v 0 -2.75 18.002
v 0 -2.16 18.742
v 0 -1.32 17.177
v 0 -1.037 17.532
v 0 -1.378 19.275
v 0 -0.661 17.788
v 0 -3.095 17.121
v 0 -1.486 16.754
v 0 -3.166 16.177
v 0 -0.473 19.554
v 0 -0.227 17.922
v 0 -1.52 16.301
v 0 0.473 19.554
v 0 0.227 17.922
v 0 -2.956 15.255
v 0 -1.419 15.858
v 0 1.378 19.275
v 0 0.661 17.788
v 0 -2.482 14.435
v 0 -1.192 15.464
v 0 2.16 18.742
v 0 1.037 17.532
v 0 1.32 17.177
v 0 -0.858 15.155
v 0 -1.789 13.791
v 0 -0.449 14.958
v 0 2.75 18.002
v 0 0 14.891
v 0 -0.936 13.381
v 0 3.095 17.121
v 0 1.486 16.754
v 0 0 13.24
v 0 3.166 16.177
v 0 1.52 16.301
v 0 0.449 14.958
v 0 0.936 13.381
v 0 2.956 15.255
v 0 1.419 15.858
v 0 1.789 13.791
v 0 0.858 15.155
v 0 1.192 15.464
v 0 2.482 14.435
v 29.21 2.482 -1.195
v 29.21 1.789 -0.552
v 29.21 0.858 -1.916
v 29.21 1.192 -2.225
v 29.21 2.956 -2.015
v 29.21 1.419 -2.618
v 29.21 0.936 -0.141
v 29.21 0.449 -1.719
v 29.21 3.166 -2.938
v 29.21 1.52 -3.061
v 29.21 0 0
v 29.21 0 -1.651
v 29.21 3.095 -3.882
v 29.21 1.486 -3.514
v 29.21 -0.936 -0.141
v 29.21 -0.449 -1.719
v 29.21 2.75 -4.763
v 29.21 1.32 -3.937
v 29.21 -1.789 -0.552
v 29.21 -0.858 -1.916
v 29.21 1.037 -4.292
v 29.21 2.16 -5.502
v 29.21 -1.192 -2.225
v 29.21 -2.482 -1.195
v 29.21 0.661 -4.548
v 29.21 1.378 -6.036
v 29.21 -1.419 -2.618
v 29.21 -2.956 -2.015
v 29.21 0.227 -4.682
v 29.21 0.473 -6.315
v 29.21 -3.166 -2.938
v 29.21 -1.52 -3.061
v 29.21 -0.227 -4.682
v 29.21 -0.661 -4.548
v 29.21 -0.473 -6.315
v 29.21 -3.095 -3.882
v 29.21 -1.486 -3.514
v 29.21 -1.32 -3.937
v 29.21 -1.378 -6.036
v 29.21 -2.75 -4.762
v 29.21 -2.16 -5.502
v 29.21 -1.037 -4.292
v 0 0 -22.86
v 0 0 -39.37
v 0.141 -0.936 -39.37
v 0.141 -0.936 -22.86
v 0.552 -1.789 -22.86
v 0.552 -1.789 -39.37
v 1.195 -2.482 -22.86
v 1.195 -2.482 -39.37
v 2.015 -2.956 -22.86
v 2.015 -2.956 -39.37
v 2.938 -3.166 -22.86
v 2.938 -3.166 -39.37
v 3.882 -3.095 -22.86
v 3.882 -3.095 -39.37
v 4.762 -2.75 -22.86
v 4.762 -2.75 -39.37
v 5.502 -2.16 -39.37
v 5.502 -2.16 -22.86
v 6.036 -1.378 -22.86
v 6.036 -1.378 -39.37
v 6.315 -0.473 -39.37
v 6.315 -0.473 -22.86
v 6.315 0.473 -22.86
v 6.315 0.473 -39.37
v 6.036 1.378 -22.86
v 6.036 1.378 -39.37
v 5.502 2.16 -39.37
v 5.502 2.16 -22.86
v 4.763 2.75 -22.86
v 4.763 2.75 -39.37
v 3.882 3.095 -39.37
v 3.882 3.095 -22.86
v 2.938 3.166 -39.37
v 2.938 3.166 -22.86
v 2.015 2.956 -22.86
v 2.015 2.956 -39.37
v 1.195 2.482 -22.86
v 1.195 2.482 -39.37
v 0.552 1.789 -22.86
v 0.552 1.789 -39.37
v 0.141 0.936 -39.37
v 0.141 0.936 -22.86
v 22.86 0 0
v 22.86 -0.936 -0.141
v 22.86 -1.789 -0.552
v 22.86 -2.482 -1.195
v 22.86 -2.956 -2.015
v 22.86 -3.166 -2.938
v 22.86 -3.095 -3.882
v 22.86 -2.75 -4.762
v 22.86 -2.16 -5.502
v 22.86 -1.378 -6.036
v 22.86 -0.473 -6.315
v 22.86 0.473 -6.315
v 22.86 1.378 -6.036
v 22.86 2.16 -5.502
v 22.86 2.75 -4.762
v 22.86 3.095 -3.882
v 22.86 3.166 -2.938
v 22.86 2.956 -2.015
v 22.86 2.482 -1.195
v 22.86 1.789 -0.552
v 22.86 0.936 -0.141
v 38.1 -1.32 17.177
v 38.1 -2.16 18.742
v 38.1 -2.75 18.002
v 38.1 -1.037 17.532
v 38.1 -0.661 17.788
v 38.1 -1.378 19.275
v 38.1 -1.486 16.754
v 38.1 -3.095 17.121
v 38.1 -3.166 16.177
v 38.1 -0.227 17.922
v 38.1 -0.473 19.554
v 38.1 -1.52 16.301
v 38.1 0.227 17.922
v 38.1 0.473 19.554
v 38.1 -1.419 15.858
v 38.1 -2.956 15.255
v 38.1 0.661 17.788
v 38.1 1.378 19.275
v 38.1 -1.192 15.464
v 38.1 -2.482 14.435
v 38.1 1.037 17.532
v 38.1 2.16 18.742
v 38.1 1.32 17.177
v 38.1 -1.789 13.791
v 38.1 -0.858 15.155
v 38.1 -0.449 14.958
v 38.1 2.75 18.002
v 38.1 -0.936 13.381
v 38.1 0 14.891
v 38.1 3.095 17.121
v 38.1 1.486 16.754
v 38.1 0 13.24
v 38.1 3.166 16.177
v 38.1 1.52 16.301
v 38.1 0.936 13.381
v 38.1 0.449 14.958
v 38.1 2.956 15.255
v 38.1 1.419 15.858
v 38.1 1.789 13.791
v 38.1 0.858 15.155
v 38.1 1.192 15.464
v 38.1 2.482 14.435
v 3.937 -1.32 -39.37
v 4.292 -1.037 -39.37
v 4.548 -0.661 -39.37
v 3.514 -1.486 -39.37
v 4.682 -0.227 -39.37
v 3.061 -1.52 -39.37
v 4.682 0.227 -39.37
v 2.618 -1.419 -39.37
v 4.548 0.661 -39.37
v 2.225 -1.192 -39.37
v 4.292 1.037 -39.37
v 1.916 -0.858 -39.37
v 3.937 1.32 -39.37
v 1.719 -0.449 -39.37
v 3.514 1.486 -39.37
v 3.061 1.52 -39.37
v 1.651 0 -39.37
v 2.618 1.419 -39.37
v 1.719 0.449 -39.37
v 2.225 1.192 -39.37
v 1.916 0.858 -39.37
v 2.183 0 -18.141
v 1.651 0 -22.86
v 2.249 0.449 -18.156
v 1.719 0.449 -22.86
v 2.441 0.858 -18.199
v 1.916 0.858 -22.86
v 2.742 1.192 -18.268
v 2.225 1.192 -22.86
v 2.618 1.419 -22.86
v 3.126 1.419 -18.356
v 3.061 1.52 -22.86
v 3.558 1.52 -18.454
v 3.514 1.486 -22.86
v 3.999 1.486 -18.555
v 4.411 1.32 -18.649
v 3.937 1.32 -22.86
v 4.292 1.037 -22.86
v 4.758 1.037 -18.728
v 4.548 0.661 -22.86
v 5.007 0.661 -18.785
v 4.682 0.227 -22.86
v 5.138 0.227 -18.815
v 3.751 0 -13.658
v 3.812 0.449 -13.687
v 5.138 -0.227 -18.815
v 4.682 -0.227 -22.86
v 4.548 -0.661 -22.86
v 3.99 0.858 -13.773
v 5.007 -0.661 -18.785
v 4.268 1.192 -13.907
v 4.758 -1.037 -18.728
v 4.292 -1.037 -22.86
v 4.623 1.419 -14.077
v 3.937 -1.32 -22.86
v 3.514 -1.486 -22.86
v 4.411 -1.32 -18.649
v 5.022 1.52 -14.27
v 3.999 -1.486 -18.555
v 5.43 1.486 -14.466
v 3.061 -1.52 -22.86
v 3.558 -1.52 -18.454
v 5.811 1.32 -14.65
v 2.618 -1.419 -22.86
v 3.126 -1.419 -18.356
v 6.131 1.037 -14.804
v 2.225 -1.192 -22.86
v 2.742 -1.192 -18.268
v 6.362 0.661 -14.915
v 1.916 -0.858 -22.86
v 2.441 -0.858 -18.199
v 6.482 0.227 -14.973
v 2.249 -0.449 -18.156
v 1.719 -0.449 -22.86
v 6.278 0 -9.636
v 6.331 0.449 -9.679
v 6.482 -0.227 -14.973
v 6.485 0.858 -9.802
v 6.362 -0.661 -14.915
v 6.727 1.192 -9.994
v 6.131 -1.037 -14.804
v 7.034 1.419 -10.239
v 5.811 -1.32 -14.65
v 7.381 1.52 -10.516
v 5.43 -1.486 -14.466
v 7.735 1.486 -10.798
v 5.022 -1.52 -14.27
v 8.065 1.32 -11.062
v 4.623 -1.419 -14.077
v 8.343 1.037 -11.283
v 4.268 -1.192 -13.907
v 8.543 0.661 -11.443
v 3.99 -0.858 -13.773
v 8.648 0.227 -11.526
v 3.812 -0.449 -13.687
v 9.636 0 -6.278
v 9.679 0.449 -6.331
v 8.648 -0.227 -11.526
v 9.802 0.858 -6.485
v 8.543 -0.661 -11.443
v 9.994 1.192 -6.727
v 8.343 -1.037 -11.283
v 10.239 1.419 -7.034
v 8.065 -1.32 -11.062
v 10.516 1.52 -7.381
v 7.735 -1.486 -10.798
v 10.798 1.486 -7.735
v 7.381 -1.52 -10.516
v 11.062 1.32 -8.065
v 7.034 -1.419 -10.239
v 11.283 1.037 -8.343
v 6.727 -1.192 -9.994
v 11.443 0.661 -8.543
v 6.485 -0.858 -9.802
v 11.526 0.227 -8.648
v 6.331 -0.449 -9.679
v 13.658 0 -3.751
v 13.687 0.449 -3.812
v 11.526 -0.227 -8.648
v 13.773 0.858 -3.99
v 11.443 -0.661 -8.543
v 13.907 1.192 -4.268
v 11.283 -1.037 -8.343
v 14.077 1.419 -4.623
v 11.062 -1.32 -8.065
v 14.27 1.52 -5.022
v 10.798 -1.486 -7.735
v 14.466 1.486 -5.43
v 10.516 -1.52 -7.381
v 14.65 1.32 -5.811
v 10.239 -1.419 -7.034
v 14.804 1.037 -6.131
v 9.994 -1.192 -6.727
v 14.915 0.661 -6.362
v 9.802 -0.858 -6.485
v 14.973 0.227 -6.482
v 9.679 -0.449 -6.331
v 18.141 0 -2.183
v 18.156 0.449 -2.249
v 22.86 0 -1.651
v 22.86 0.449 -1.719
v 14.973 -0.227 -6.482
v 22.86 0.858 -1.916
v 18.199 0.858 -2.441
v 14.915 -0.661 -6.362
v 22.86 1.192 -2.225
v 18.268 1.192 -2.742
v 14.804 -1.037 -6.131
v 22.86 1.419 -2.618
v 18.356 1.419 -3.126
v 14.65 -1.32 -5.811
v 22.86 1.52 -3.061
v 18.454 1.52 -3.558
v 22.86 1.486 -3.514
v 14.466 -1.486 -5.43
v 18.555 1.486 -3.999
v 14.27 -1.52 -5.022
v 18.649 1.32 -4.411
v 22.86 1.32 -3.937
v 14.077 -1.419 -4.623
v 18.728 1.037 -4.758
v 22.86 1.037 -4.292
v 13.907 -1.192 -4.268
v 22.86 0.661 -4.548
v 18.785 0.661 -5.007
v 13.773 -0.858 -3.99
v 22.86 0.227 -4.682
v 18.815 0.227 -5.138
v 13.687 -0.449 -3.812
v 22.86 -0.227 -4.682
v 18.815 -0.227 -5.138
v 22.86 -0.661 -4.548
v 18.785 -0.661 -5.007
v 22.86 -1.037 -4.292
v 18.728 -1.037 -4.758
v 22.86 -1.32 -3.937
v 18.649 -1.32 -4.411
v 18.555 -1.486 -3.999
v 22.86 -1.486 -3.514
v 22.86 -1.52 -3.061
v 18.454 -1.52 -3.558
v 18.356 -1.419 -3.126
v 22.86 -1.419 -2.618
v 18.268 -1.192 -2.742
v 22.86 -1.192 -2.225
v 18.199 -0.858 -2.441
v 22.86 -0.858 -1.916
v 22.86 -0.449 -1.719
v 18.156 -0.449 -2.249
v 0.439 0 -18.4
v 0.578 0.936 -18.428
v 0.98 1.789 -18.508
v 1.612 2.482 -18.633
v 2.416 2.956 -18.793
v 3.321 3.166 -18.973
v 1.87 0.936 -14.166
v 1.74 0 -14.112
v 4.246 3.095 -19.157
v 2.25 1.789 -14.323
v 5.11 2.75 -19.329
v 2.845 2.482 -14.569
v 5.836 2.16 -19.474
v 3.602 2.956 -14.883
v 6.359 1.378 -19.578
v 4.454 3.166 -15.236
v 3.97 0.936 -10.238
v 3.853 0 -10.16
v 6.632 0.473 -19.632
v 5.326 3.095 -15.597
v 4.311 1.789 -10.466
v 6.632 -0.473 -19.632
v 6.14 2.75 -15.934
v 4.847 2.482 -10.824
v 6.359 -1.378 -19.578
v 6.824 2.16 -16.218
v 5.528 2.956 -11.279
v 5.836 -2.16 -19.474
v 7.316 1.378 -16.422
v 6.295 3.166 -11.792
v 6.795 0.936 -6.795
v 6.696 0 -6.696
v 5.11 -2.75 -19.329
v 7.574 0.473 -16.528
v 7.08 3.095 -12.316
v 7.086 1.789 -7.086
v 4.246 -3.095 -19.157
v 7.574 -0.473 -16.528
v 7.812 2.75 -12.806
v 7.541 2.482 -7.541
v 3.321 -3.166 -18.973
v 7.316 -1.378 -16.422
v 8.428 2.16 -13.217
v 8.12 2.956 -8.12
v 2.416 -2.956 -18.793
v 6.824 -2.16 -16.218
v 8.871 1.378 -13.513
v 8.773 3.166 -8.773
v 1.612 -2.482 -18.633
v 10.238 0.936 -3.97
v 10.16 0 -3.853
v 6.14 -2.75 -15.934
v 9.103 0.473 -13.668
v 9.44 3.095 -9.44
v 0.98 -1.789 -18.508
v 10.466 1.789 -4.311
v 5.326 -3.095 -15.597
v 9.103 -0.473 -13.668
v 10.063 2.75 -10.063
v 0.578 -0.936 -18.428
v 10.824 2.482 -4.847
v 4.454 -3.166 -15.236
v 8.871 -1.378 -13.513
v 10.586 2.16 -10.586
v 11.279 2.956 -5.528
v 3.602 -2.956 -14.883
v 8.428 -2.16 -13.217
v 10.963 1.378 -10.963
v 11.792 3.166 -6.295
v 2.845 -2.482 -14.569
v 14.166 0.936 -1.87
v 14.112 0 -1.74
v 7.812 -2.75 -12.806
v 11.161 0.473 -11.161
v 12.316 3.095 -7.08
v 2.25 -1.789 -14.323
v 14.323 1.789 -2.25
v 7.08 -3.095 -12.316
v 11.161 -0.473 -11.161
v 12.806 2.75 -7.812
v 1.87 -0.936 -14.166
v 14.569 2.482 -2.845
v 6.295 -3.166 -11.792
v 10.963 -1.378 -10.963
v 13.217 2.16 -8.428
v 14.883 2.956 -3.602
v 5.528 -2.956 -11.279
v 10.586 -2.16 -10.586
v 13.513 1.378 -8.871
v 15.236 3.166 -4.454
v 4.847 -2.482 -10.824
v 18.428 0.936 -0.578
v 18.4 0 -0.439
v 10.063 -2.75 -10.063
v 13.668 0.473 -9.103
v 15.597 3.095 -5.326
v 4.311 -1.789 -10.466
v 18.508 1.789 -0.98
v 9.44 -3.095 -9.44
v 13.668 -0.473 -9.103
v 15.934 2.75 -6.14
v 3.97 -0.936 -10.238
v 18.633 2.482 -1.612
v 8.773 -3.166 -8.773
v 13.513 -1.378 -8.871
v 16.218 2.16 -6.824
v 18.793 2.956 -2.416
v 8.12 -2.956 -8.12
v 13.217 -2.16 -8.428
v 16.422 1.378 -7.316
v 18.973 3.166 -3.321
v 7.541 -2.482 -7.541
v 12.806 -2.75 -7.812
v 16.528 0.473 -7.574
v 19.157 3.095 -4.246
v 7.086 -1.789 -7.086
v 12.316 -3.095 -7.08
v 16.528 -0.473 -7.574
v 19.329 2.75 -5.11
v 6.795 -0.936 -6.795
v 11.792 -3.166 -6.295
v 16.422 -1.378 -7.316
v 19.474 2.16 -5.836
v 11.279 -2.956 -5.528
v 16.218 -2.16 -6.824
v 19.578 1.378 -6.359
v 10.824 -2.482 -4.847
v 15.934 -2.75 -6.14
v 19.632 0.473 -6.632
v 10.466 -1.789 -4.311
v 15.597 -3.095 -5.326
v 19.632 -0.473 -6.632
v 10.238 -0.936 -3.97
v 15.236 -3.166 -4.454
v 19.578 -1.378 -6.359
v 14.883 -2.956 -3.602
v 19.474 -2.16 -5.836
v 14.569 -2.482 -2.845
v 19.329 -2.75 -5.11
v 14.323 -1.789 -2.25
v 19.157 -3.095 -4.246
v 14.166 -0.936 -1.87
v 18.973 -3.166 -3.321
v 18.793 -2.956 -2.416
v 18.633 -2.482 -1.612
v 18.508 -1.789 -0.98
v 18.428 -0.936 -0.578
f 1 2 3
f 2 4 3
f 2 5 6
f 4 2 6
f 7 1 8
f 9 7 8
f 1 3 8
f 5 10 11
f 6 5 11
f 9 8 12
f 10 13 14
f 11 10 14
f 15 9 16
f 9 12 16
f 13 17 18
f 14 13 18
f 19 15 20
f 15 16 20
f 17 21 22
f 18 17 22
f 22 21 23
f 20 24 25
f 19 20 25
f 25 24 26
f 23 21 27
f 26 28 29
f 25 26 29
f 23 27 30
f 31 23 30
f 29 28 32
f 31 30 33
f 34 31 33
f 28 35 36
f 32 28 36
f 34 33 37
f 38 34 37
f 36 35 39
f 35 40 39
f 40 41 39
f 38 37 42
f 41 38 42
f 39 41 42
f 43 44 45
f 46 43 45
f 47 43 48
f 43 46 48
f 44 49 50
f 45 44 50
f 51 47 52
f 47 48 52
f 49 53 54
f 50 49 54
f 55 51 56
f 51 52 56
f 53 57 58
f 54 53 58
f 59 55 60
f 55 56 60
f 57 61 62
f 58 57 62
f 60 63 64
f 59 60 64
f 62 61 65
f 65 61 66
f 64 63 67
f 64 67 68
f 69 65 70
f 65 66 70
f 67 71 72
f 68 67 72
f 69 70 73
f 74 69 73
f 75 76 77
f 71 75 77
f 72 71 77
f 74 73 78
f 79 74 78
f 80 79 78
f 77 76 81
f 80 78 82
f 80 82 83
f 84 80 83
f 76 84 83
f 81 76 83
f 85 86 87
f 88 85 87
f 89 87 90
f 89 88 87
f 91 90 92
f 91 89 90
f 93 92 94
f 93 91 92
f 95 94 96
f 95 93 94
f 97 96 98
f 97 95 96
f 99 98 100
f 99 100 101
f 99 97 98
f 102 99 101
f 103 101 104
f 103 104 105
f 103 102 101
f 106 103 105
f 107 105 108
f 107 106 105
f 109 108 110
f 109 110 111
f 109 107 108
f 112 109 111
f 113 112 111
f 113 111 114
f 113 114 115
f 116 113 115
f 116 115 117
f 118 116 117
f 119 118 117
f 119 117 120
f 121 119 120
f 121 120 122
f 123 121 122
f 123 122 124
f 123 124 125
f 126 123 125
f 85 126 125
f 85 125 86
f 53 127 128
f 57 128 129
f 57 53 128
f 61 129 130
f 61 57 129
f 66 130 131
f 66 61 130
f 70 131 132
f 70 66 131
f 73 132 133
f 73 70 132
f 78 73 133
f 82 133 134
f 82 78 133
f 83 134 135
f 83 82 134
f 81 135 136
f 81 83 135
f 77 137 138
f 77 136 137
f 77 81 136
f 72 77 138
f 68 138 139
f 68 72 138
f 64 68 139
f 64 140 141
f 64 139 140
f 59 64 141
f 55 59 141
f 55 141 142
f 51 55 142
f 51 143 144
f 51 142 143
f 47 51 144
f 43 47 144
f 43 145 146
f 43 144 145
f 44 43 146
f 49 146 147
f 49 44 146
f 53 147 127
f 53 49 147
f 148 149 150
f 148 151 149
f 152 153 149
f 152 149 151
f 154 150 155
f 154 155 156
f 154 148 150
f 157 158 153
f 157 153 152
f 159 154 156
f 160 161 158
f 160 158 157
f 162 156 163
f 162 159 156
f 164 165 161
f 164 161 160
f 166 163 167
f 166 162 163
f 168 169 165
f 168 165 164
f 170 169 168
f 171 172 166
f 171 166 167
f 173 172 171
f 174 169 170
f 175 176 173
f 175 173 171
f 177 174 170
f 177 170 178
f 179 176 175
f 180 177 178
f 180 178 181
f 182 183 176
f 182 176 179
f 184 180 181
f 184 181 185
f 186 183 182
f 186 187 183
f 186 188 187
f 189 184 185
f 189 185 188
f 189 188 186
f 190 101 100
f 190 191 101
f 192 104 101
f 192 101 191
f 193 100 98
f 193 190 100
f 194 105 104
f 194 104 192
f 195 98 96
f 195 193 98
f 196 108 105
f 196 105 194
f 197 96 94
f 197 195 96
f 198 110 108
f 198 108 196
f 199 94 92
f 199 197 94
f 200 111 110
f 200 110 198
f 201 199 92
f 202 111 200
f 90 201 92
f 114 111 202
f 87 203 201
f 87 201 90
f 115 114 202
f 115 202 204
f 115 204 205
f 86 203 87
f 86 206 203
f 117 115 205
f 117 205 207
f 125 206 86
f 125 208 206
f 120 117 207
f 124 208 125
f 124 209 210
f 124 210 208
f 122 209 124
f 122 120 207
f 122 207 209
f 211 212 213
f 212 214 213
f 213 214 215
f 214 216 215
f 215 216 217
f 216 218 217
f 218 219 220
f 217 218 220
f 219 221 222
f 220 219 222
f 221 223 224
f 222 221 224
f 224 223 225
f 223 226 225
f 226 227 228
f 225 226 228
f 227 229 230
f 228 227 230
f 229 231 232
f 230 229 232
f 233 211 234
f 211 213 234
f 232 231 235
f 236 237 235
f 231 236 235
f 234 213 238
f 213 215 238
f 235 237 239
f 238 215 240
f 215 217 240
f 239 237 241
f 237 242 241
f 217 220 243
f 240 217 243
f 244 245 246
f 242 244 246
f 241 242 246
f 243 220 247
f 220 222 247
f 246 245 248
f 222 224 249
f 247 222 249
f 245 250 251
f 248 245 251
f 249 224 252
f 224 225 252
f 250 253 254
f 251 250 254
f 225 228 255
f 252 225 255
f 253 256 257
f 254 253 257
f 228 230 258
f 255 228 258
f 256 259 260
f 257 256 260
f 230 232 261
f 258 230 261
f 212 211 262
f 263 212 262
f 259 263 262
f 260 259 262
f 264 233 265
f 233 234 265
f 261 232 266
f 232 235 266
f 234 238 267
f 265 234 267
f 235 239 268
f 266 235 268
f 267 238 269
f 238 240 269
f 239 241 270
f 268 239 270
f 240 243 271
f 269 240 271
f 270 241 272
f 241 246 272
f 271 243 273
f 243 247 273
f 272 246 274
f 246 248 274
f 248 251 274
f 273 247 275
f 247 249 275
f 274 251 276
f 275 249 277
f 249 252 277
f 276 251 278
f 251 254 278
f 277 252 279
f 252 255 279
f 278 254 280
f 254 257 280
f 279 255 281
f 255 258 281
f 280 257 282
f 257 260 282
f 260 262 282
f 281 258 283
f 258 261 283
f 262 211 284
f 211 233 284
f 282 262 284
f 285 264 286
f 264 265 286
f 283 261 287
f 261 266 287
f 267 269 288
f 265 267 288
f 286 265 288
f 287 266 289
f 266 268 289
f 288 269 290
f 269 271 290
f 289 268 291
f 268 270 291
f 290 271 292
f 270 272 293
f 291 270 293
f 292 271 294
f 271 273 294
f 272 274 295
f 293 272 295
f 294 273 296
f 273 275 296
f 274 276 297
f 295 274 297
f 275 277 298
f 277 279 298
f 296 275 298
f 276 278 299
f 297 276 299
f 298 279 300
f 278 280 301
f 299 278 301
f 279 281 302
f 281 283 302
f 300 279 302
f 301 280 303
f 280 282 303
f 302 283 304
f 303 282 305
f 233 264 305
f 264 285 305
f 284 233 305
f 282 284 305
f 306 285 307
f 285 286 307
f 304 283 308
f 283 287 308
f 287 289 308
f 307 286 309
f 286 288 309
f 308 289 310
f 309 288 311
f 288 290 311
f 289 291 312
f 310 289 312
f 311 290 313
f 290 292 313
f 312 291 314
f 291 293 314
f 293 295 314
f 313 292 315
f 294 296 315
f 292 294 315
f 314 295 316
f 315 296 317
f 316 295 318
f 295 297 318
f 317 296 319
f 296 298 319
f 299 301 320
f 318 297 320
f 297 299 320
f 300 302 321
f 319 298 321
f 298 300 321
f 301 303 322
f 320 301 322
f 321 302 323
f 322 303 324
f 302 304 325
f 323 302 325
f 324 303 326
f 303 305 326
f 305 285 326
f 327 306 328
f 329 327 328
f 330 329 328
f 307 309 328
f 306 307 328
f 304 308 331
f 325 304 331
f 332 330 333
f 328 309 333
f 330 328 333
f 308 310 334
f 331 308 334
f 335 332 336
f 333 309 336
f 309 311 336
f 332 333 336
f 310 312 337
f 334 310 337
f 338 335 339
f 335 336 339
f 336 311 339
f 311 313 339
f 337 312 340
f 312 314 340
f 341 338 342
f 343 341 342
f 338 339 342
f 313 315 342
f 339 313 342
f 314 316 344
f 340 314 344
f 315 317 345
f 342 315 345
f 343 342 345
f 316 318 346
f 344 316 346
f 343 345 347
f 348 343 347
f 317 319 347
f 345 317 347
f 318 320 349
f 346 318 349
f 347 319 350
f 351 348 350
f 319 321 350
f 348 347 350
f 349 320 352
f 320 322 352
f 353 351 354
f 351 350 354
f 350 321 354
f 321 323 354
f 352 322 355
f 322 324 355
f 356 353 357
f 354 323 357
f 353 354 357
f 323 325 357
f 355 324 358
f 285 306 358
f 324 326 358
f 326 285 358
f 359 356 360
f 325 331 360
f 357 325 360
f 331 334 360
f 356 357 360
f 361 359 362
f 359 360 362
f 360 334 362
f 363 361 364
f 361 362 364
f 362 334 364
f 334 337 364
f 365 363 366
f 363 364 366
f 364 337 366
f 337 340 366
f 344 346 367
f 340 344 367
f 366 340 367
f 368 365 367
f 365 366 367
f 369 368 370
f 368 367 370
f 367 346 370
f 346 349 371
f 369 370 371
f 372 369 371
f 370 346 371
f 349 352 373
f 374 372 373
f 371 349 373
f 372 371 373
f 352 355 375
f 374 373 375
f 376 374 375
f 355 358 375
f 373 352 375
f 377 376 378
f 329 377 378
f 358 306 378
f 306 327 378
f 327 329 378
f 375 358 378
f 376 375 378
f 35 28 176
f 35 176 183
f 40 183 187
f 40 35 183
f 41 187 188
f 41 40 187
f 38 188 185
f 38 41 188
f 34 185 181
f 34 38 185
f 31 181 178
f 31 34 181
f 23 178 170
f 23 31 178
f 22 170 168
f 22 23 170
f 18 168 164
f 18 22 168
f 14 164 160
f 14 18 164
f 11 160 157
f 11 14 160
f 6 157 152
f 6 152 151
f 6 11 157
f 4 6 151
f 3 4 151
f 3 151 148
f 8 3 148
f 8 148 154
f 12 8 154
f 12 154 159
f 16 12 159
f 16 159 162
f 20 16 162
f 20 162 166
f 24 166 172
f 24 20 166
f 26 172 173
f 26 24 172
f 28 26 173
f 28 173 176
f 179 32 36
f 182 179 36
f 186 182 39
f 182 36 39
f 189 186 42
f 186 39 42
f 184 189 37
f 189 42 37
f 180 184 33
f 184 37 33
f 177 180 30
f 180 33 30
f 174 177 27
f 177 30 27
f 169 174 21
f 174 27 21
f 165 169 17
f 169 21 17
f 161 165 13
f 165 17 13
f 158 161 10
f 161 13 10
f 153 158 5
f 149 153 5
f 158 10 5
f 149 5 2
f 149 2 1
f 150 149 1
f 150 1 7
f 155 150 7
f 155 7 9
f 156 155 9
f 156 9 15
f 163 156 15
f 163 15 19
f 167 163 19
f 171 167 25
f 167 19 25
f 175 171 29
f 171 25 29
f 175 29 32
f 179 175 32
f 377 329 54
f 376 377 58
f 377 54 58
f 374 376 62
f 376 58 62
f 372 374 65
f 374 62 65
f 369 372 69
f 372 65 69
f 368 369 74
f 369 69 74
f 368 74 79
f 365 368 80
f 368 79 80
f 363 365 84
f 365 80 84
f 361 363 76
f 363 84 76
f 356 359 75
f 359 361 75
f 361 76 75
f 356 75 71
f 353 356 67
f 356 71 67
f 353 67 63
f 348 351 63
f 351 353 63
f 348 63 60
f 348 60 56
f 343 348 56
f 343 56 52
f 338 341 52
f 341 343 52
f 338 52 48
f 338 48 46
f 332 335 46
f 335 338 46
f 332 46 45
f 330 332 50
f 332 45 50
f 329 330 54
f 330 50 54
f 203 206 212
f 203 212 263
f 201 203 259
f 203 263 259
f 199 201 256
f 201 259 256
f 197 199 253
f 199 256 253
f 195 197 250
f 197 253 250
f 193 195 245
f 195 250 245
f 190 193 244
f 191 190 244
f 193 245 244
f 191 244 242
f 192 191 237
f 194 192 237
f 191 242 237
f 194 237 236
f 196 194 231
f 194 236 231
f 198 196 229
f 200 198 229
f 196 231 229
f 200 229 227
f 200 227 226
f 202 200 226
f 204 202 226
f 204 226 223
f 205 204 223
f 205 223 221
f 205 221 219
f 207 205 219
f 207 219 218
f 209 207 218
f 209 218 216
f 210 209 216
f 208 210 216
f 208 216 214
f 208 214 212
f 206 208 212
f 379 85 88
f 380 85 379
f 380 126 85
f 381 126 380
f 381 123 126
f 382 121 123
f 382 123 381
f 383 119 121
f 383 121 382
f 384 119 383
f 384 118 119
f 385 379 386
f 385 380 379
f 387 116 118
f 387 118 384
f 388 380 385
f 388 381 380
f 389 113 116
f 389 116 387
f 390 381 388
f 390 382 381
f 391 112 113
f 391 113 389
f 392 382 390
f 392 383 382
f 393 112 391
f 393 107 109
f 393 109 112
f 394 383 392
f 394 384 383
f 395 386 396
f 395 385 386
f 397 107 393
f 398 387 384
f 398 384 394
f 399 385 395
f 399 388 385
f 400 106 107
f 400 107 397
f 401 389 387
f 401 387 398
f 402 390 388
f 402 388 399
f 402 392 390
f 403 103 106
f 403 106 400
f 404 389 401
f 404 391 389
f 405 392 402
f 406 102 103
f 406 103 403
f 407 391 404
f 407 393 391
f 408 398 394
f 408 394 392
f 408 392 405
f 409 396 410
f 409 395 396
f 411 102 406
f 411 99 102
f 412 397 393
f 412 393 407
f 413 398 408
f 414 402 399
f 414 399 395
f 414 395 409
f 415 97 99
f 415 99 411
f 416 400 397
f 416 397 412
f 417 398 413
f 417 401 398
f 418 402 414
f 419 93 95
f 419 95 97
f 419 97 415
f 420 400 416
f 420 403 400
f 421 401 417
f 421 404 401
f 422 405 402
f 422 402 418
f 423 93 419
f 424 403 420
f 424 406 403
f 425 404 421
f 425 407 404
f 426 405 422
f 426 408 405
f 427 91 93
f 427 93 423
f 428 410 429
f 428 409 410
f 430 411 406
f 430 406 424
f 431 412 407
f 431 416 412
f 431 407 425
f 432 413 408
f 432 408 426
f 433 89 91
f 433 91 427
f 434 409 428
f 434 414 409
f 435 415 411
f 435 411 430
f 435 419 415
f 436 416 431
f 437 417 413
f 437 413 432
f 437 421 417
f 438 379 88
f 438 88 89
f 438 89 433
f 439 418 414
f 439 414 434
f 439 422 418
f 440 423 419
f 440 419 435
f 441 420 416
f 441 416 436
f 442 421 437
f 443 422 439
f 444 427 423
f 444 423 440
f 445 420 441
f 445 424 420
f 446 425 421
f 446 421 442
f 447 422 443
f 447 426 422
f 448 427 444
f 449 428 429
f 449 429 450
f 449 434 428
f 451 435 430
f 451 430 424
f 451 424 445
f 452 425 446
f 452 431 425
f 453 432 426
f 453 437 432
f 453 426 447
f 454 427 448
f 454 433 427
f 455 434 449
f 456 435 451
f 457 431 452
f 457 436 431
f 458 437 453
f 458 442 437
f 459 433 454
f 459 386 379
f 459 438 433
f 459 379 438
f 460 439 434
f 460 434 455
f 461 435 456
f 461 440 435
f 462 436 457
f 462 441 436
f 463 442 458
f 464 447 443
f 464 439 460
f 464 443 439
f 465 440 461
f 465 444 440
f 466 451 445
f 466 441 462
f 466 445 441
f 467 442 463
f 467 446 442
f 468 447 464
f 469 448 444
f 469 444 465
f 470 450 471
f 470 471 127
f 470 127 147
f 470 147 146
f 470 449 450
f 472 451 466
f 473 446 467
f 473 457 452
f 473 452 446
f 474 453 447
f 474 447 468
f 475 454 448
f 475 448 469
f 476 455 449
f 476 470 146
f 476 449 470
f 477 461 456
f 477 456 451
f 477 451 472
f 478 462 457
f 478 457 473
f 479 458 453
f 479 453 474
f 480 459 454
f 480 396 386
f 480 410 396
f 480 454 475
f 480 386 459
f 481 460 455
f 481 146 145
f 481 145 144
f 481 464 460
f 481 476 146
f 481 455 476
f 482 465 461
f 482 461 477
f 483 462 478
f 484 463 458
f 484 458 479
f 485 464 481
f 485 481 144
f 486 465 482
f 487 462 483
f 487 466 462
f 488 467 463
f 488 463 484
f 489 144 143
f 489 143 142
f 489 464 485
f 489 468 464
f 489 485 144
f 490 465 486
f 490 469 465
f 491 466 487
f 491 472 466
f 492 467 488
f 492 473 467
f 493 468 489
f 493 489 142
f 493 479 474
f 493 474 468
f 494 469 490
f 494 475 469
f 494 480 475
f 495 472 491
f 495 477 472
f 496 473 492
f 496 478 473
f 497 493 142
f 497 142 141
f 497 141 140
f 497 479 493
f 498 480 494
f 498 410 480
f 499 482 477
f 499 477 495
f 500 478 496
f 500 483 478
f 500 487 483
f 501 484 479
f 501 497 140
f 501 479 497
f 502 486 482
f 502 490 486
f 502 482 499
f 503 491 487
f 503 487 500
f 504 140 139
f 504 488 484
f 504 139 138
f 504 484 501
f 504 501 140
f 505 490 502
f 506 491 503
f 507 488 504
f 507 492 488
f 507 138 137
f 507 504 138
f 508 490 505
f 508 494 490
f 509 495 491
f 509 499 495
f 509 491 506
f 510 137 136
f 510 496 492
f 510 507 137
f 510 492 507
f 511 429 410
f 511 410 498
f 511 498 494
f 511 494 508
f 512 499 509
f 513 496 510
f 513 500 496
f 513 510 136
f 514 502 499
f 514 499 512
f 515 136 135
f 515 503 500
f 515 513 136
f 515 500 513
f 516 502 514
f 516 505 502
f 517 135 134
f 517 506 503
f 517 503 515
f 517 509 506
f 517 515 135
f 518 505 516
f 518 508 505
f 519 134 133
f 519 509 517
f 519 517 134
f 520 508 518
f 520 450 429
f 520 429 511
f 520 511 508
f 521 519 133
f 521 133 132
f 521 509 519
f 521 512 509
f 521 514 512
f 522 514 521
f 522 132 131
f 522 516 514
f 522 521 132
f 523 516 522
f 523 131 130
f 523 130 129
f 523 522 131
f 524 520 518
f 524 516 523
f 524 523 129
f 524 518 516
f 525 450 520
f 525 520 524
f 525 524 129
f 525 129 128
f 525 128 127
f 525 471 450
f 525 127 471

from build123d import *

# Parameters (mm, degrees)
SKETCH2_R           = 3.175
SKETCH2_R_2         = 1.524
SKETCH3_R           = 3.175
SKETCH3_R_2         = 1.524
BOSS_EXTRUDE1_DEPTH = 38.1


with BuildPart() as part:
    # Sweep1: sweep along a path in Sketch1
    with BuildLine(Plane(origin=(0, 0, 0), x_dir=(1, 0, 0), z_dir=(0, 1, 0))) as sweep1_path:
        Line((0, 39.37), (0, 22.86))
        ThreePointArc((0, 22.86), (6.695538982, 6.695538982), (22.86, 0))
        Line((22.86, 0), (29.21, 0))
    # Sketch2 → Sweep1 (sweep)
    with BuildSketch(Plane.ZY.offset(-29.21)):
        with Locations((-3.175, 0)):
            Circle(SKETCH2_R)
        with Locations((-3.175, 0)):
            Circle(SKETCH2_R_2, mode=Mode.SUBTRACT)
    sweep(path=sweep1_path.line)


with BuildPart() as body_2:
    # Sketch3 → Boss-Extrude1 (new body)
    with BuildSketch(Plane(origin=(0, 0, 0), x_dir=(0, 0, -1), z_dir=(1, 0, 0))):
        with Locations((-16.414544802, 0)):
            Circle(SKETCH3_R)
        with Locations((-16.414544802, 0)):
            Circle(SKETCH3_R_2, mode=Mode.SUBTRACT)
    extrude(amount=BOSS_EXTRUDE1_DEPTH)


solid = Compound([part.part, body_2.part])
